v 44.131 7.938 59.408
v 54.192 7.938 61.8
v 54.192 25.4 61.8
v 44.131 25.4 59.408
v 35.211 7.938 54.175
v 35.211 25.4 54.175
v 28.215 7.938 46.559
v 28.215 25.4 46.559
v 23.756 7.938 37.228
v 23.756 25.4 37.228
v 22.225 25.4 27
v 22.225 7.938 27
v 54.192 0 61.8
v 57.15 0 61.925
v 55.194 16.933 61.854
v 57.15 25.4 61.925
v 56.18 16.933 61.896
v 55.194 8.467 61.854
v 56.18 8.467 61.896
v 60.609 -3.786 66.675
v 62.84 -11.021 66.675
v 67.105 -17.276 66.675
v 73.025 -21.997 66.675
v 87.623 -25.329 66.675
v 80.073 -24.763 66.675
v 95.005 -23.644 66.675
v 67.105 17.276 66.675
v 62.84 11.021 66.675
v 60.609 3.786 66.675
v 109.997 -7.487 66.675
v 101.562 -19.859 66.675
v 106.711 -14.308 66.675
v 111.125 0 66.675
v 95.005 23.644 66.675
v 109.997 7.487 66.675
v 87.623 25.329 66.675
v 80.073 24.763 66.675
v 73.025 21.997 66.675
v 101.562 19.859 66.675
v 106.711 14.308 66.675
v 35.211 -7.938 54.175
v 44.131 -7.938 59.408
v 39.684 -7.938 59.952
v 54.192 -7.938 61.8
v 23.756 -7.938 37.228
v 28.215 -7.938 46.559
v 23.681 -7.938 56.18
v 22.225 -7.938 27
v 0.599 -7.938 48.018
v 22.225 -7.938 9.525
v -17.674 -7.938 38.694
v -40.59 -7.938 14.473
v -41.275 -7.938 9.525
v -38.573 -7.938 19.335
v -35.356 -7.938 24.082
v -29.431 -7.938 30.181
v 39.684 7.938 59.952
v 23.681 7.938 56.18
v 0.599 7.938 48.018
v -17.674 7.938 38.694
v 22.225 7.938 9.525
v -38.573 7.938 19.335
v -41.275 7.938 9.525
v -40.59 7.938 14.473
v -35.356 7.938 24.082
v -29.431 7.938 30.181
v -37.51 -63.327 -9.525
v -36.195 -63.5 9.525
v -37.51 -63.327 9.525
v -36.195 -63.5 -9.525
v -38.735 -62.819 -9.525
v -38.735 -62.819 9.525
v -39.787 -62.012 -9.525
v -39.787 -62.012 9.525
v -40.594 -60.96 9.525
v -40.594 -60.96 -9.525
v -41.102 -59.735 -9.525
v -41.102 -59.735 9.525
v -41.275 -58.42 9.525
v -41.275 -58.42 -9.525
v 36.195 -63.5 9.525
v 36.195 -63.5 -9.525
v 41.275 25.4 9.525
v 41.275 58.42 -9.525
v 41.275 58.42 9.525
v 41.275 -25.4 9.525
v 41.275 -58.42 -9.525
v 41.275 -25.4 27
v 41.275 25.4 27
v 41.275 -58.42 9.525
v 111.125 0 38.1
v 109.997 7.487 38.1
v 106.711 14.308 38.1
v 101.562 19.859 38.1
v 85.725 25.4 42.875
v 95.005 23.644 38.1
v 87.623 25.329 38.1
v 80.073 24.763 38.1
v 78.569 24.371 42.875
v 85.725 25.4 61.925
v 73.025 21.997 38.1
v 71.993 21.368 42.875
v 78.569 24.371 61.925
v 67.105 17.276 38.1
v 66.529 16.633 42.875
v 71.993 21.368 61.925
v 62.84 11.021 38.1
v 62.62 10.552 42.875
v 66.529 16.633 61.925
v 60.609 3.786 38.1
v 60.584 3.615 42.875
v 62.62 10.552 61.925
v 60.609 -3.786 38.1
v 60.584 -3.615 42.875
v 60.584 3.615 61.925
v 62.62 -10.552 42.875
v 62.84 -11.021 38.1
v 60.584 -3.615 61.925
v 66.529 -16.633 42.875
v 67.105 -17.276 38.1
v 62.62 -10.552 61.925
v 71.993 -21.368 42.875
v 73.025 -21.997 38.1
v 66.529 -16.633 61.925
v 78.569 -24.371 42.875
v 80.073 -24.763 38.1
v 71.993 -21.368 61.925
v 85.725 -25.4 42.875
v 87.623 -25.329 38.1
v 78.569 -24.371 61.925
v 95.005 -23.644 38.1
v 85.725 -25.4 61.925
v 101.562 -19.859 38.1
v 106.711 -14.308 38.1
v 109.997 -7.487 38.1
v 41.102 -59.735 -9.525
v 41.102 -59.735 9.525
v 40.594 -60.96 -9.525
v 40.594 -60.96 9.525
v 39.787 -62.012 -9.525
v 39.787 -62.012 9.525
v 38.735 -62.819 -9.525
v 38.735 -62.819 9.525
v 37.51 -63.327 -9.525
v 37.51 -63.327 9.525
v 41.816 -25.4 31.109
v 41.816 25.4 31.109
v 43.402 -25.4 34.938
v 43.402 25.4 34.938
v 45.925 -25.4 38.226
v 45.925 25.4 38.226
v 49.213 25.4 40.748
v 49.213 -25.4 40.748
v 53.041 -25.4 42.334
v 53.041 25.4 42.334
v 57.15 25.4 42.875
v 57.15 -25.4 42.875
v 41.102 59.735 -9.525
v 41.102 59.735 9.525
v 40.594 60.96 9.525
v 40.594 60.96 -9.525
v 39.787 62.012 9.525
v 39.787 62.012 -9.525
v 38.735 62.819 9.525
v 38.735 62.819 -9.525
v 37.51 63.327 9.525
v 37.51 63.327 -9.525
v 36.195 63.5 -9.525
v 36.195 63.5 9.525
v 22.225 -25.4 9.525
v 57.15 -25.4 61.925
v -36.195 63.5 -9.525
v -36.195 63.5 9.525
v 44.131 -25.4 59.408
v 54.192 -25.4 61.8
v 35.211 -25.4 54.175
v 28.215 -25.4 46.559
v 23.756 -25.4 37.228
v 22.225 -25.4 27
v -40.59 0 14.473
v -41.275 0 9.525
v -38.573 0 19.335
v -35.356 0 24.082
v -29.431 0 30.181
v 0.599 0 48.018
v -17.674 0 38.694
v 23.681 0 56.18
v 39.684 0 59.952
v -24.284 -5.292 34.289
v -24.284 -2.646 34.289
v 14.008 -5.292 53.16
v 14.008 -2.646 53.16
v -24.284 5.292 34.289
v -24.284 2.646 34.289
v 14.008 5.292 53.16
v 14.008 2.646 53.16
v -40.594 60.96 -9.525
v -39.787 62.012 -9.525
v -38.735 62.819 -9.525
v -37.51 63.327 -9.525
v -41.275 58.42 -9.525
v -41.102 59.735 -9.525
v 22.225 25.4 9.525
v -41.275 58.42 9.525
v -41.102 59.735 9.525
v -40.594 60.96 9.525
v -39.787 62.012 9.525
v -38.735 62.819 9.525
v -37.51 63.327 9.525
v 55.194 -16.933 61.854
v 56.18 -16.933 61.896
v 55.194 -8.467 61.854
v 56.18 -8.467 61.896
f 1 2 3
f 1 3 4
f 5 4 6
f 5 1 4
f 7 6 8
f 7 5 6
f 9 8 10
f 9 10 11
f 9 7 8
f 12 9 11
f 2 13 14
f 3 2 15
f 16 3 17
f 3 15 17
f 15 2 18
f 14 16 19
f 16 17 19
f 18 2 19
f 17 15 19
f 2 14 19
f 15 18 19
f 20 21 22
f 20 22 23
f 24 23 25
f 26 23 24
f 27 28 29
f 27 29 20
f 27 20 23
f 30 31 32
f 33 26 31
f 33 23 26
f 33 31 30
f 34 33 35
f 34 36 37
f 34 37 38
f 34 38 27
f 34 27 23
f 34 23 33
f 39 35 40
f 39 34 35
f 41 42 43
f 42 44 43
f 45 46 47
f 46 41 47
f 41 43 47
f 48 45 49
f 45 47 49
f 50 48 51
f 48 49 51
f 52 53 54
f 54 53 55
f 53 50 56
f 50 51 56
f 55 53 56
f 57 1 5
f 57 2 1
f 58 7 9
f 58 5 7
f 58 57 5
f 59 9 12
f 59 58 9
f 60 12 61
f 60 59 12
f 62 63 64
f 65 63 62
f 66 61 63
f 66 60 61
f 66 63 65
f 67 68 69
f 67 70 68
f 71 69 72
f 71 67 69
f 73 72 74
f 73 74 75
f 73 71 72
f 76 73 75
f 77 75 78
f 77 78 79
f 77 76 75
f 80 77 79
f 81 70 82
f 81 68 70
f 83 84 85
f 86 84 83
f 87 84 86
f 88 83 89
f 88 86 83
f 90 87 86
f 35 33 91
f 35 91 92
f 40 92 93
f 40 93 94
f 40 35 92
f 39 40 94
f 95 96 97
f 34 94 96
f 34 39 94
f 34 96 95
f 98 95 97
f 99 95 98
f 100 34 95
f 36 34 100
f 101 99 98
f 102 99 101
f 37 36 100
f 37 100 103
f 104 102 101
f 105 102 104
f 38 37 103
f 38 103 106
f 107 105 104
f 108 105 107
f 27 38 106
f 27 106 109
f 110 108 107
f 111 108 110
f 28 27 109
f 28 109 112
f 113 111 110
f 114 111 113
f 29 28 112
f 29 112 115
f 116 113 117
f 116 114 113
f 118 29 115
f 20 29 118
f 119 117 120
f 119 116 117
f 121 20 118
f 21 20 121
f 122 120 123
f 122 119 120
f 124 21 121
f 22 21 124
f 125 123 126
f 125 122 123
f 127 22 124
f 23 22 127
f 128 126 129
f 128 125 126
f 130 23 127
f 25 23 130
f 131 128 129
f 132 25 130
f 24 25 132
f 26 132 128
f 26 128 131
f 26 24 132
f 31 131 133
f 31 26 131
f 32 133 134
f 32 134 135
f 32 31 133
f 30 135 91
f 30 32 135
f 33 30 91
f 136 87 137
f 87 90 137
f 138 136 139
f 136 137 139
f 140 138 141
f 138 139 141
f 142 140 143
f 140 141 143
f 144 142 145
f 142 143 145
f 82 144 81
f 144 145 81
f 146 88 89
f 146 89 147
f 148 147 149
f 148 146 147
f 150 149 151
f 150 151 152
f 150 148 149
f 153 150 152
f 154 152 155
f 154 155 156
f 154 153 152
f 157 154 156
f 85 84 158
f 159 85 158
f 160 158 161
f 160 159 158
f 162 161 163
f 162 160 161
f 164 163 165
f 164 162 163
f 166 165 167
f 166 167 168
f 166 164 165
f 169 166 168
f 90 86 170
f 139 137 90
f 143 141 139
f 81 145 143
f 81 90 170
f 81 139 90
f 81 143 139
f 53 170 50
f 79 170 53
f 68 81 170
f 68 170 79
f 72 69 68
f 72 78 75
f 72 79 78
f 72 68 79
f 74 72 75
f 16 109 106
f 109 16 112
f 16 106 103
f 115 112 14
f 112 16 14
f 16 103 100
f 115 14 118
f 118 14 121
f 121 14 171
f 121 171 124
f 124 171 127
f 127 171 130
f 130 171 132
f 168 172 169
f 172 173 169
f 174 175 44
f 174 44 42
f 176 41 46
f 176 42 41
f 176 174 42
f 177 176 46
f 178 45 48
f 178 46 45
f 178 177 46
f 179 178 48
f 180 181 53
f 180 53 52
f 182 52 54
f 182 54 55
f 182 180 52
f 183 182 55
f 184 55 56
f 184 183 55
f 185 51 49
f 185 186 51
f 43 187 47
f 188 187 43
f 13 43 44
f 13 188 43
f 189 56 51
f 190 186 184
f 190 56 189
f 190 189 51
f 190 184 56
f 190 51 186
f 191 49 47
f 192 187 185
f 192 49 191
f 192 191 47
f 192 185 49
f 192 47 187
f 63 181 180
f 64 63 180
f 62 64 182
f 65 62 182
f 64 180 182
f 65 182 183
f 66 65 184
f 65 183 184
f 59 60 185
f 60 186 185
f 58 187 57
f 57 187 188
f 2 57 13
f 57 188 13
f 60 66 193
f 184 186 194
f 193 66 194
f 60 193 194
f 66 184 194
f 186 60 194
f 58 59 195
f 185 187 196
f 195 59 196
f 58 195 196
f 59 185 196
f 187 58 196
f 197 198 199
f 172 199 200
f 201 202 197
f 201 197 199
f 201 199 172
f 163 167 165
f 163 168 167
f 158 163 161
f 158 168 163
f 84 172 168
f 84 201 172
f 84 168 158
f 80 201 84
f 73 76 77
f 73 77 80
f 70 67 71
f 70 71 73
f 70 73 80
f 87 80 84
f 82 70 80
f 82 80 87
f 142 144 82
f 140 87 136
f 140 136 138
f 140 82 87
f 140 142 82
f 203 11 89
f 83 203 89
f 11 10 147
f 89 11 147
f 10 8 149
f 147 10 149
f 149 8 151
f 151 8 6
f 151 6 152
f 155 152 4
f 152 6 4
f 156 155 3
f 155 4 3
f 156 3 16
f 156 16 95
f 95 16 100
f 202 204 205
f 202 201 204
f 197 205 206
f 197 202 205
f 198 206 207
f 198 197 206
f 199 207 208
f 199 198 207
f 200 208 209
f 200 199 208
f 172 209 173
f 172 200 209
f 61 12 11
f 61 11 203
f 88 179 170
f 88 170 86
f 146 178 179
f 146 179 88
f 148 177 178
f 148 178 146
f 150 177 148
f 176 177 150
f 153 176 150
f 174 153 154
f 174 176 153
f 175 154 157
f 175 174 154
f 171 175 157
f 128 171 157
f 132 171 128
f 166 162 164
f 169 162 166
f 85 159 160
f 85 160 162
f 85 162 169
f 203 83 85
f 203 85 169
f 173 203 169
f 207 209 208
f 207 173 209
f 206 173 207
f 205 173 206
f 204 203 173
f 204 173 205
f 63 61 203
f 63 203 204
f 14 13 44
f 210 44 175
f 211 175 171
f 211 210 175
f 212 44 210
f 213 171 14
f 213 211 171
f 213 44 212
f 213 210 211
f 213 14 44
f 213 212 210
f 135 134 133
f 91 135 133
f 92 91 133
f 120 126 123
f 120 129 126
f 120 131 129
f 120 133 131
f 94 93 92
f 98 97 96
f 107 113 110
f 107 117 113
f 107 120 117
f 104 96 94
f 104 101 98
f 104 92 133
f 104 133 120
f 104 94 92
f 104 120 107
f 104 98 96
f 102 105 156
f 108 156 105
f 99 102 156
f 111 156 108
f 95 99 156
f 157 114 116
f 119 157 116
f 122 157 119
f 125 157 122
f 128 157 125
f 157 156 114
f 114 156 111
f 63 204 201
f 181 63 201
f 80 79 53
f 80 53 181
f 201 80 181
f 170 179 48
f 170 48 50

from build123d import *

# Parameters (mm, degrees)
F1_DEPTH = 63.5
F2_DEPTH = 25.4
F0_W     = 25.4
F0_H     = 19.05
F3_DEPTH = 25.4
F4_DEPTH = 7.9375
F6_R     = 5.08


with BuildPart() as f1:
    # F0 (on Front) → F1 (new body, symmetric)
    with BuildSketch(Plane.XZ):
        Polygon((22.225, 9.525), (-41.275, 9.525), (-41.275, -9.525), (41.275, -9.525), (41.275, 9.525), align=None)
    extrude(amount=F1_DEPTH, both=True)

    # F0 (on Front) → F2 (join, symmetric)
    with BuildSketch(Plane.XZ):
        with BuildLine():
            Line((22.225, 27.0002), (22.225, 9.525))
            Line((22.225, 9.525), (41.275, 9.525))
            Line((41.275, 9.525), (41.275, 27.0002))
            ThreePointArc((41.275, 27.0002), (45.9246798487, 38.2255201513), (57.15, 42.8752))
            Line((57.15, 42.8752), (60.325, 42.8752))
            Line((60.325, 42.8752), (60.325, 61.9252))
            Line((60.325, 61.9252), (57.15, 61.9252))
            add(Edge.make_bspline(
                [(54.1922002544, 61.799726515), (55.2011160531, 61.8602288921), (56.1877673856, 61.9022138929), (57.15, 61.9252)],
                knots=[108.3505777535, 108.3505777535, 108.3505777535, 108.3505777535, 111.5045361635, 111.5045361635, 111.5045361635, 111.5045361635], degree=3))
            ThreePointArc((54.1922002544, 61.799726515), (31.4298057831, 50.627032933), (22.225, 27.0002))
        make_face()
    extrude(amount=F2_DEPTH, both=True)

    # F0 (on Front) → F3 (join, symmetric)
    with BuildSketch(Plane.XZ):
        with Locations((73.025, 52.4002)):
            Rectangle(F0_W, F0_H)
    extrude(amount=F3_DEPTH, both=True)

    # F0 (on Front) → F4 (join, symmetric)
    with BuildSketch(Plane.XZ):
        with BuildLine():
            add(Edge.make_bspline(
                [(-41.275, 9.525), (-41.4042765408, 35.7887962945), (19.5320698785, 59.7212376229), (54.1922002544, 61.799726515)],
                knots=[0, 0, 0, 0, 108.3505777535, 108.3505777535, 108.3505777535, 108.3505777535], degree=3))
            Line((-41.275, 9.525), (22.225, 9.525))
            Line((22.225, 9.525), (22.225, 27.0002))
            ThreePointArc((22.225, 27.0002), (31.4298057831, 50.627032933), (54.1922002544, 61.799726515))
        make_face()
    extrude(amount=F4_DEPTH, both=True)

    # F0 (on Front) → F5 (revolve)
    with BuildSketch(Plane.XZ):
        Polygon((85.725, 66.675), (85.725, 61.9252), (85.725, 42.8752), (85.725, 38.1), (111.125, 38.1), (111.125, 66.675), align=None)
    revolve(axis=Axis((85.725, 0, 52.3875), (0, 0, 1)))

    # F6
    f6_edges = [f1.edges().sort_by_distance(p)[0] for p in [
        (-41.275, -63.5, 0),
        (-41.275, 63.5, 0),
        (41.275, 63.5, 0),
        (41.275, -63.5, 0),
    ]]
    fillet(f6_edges, radius=F6_R)


solid = f1.part
